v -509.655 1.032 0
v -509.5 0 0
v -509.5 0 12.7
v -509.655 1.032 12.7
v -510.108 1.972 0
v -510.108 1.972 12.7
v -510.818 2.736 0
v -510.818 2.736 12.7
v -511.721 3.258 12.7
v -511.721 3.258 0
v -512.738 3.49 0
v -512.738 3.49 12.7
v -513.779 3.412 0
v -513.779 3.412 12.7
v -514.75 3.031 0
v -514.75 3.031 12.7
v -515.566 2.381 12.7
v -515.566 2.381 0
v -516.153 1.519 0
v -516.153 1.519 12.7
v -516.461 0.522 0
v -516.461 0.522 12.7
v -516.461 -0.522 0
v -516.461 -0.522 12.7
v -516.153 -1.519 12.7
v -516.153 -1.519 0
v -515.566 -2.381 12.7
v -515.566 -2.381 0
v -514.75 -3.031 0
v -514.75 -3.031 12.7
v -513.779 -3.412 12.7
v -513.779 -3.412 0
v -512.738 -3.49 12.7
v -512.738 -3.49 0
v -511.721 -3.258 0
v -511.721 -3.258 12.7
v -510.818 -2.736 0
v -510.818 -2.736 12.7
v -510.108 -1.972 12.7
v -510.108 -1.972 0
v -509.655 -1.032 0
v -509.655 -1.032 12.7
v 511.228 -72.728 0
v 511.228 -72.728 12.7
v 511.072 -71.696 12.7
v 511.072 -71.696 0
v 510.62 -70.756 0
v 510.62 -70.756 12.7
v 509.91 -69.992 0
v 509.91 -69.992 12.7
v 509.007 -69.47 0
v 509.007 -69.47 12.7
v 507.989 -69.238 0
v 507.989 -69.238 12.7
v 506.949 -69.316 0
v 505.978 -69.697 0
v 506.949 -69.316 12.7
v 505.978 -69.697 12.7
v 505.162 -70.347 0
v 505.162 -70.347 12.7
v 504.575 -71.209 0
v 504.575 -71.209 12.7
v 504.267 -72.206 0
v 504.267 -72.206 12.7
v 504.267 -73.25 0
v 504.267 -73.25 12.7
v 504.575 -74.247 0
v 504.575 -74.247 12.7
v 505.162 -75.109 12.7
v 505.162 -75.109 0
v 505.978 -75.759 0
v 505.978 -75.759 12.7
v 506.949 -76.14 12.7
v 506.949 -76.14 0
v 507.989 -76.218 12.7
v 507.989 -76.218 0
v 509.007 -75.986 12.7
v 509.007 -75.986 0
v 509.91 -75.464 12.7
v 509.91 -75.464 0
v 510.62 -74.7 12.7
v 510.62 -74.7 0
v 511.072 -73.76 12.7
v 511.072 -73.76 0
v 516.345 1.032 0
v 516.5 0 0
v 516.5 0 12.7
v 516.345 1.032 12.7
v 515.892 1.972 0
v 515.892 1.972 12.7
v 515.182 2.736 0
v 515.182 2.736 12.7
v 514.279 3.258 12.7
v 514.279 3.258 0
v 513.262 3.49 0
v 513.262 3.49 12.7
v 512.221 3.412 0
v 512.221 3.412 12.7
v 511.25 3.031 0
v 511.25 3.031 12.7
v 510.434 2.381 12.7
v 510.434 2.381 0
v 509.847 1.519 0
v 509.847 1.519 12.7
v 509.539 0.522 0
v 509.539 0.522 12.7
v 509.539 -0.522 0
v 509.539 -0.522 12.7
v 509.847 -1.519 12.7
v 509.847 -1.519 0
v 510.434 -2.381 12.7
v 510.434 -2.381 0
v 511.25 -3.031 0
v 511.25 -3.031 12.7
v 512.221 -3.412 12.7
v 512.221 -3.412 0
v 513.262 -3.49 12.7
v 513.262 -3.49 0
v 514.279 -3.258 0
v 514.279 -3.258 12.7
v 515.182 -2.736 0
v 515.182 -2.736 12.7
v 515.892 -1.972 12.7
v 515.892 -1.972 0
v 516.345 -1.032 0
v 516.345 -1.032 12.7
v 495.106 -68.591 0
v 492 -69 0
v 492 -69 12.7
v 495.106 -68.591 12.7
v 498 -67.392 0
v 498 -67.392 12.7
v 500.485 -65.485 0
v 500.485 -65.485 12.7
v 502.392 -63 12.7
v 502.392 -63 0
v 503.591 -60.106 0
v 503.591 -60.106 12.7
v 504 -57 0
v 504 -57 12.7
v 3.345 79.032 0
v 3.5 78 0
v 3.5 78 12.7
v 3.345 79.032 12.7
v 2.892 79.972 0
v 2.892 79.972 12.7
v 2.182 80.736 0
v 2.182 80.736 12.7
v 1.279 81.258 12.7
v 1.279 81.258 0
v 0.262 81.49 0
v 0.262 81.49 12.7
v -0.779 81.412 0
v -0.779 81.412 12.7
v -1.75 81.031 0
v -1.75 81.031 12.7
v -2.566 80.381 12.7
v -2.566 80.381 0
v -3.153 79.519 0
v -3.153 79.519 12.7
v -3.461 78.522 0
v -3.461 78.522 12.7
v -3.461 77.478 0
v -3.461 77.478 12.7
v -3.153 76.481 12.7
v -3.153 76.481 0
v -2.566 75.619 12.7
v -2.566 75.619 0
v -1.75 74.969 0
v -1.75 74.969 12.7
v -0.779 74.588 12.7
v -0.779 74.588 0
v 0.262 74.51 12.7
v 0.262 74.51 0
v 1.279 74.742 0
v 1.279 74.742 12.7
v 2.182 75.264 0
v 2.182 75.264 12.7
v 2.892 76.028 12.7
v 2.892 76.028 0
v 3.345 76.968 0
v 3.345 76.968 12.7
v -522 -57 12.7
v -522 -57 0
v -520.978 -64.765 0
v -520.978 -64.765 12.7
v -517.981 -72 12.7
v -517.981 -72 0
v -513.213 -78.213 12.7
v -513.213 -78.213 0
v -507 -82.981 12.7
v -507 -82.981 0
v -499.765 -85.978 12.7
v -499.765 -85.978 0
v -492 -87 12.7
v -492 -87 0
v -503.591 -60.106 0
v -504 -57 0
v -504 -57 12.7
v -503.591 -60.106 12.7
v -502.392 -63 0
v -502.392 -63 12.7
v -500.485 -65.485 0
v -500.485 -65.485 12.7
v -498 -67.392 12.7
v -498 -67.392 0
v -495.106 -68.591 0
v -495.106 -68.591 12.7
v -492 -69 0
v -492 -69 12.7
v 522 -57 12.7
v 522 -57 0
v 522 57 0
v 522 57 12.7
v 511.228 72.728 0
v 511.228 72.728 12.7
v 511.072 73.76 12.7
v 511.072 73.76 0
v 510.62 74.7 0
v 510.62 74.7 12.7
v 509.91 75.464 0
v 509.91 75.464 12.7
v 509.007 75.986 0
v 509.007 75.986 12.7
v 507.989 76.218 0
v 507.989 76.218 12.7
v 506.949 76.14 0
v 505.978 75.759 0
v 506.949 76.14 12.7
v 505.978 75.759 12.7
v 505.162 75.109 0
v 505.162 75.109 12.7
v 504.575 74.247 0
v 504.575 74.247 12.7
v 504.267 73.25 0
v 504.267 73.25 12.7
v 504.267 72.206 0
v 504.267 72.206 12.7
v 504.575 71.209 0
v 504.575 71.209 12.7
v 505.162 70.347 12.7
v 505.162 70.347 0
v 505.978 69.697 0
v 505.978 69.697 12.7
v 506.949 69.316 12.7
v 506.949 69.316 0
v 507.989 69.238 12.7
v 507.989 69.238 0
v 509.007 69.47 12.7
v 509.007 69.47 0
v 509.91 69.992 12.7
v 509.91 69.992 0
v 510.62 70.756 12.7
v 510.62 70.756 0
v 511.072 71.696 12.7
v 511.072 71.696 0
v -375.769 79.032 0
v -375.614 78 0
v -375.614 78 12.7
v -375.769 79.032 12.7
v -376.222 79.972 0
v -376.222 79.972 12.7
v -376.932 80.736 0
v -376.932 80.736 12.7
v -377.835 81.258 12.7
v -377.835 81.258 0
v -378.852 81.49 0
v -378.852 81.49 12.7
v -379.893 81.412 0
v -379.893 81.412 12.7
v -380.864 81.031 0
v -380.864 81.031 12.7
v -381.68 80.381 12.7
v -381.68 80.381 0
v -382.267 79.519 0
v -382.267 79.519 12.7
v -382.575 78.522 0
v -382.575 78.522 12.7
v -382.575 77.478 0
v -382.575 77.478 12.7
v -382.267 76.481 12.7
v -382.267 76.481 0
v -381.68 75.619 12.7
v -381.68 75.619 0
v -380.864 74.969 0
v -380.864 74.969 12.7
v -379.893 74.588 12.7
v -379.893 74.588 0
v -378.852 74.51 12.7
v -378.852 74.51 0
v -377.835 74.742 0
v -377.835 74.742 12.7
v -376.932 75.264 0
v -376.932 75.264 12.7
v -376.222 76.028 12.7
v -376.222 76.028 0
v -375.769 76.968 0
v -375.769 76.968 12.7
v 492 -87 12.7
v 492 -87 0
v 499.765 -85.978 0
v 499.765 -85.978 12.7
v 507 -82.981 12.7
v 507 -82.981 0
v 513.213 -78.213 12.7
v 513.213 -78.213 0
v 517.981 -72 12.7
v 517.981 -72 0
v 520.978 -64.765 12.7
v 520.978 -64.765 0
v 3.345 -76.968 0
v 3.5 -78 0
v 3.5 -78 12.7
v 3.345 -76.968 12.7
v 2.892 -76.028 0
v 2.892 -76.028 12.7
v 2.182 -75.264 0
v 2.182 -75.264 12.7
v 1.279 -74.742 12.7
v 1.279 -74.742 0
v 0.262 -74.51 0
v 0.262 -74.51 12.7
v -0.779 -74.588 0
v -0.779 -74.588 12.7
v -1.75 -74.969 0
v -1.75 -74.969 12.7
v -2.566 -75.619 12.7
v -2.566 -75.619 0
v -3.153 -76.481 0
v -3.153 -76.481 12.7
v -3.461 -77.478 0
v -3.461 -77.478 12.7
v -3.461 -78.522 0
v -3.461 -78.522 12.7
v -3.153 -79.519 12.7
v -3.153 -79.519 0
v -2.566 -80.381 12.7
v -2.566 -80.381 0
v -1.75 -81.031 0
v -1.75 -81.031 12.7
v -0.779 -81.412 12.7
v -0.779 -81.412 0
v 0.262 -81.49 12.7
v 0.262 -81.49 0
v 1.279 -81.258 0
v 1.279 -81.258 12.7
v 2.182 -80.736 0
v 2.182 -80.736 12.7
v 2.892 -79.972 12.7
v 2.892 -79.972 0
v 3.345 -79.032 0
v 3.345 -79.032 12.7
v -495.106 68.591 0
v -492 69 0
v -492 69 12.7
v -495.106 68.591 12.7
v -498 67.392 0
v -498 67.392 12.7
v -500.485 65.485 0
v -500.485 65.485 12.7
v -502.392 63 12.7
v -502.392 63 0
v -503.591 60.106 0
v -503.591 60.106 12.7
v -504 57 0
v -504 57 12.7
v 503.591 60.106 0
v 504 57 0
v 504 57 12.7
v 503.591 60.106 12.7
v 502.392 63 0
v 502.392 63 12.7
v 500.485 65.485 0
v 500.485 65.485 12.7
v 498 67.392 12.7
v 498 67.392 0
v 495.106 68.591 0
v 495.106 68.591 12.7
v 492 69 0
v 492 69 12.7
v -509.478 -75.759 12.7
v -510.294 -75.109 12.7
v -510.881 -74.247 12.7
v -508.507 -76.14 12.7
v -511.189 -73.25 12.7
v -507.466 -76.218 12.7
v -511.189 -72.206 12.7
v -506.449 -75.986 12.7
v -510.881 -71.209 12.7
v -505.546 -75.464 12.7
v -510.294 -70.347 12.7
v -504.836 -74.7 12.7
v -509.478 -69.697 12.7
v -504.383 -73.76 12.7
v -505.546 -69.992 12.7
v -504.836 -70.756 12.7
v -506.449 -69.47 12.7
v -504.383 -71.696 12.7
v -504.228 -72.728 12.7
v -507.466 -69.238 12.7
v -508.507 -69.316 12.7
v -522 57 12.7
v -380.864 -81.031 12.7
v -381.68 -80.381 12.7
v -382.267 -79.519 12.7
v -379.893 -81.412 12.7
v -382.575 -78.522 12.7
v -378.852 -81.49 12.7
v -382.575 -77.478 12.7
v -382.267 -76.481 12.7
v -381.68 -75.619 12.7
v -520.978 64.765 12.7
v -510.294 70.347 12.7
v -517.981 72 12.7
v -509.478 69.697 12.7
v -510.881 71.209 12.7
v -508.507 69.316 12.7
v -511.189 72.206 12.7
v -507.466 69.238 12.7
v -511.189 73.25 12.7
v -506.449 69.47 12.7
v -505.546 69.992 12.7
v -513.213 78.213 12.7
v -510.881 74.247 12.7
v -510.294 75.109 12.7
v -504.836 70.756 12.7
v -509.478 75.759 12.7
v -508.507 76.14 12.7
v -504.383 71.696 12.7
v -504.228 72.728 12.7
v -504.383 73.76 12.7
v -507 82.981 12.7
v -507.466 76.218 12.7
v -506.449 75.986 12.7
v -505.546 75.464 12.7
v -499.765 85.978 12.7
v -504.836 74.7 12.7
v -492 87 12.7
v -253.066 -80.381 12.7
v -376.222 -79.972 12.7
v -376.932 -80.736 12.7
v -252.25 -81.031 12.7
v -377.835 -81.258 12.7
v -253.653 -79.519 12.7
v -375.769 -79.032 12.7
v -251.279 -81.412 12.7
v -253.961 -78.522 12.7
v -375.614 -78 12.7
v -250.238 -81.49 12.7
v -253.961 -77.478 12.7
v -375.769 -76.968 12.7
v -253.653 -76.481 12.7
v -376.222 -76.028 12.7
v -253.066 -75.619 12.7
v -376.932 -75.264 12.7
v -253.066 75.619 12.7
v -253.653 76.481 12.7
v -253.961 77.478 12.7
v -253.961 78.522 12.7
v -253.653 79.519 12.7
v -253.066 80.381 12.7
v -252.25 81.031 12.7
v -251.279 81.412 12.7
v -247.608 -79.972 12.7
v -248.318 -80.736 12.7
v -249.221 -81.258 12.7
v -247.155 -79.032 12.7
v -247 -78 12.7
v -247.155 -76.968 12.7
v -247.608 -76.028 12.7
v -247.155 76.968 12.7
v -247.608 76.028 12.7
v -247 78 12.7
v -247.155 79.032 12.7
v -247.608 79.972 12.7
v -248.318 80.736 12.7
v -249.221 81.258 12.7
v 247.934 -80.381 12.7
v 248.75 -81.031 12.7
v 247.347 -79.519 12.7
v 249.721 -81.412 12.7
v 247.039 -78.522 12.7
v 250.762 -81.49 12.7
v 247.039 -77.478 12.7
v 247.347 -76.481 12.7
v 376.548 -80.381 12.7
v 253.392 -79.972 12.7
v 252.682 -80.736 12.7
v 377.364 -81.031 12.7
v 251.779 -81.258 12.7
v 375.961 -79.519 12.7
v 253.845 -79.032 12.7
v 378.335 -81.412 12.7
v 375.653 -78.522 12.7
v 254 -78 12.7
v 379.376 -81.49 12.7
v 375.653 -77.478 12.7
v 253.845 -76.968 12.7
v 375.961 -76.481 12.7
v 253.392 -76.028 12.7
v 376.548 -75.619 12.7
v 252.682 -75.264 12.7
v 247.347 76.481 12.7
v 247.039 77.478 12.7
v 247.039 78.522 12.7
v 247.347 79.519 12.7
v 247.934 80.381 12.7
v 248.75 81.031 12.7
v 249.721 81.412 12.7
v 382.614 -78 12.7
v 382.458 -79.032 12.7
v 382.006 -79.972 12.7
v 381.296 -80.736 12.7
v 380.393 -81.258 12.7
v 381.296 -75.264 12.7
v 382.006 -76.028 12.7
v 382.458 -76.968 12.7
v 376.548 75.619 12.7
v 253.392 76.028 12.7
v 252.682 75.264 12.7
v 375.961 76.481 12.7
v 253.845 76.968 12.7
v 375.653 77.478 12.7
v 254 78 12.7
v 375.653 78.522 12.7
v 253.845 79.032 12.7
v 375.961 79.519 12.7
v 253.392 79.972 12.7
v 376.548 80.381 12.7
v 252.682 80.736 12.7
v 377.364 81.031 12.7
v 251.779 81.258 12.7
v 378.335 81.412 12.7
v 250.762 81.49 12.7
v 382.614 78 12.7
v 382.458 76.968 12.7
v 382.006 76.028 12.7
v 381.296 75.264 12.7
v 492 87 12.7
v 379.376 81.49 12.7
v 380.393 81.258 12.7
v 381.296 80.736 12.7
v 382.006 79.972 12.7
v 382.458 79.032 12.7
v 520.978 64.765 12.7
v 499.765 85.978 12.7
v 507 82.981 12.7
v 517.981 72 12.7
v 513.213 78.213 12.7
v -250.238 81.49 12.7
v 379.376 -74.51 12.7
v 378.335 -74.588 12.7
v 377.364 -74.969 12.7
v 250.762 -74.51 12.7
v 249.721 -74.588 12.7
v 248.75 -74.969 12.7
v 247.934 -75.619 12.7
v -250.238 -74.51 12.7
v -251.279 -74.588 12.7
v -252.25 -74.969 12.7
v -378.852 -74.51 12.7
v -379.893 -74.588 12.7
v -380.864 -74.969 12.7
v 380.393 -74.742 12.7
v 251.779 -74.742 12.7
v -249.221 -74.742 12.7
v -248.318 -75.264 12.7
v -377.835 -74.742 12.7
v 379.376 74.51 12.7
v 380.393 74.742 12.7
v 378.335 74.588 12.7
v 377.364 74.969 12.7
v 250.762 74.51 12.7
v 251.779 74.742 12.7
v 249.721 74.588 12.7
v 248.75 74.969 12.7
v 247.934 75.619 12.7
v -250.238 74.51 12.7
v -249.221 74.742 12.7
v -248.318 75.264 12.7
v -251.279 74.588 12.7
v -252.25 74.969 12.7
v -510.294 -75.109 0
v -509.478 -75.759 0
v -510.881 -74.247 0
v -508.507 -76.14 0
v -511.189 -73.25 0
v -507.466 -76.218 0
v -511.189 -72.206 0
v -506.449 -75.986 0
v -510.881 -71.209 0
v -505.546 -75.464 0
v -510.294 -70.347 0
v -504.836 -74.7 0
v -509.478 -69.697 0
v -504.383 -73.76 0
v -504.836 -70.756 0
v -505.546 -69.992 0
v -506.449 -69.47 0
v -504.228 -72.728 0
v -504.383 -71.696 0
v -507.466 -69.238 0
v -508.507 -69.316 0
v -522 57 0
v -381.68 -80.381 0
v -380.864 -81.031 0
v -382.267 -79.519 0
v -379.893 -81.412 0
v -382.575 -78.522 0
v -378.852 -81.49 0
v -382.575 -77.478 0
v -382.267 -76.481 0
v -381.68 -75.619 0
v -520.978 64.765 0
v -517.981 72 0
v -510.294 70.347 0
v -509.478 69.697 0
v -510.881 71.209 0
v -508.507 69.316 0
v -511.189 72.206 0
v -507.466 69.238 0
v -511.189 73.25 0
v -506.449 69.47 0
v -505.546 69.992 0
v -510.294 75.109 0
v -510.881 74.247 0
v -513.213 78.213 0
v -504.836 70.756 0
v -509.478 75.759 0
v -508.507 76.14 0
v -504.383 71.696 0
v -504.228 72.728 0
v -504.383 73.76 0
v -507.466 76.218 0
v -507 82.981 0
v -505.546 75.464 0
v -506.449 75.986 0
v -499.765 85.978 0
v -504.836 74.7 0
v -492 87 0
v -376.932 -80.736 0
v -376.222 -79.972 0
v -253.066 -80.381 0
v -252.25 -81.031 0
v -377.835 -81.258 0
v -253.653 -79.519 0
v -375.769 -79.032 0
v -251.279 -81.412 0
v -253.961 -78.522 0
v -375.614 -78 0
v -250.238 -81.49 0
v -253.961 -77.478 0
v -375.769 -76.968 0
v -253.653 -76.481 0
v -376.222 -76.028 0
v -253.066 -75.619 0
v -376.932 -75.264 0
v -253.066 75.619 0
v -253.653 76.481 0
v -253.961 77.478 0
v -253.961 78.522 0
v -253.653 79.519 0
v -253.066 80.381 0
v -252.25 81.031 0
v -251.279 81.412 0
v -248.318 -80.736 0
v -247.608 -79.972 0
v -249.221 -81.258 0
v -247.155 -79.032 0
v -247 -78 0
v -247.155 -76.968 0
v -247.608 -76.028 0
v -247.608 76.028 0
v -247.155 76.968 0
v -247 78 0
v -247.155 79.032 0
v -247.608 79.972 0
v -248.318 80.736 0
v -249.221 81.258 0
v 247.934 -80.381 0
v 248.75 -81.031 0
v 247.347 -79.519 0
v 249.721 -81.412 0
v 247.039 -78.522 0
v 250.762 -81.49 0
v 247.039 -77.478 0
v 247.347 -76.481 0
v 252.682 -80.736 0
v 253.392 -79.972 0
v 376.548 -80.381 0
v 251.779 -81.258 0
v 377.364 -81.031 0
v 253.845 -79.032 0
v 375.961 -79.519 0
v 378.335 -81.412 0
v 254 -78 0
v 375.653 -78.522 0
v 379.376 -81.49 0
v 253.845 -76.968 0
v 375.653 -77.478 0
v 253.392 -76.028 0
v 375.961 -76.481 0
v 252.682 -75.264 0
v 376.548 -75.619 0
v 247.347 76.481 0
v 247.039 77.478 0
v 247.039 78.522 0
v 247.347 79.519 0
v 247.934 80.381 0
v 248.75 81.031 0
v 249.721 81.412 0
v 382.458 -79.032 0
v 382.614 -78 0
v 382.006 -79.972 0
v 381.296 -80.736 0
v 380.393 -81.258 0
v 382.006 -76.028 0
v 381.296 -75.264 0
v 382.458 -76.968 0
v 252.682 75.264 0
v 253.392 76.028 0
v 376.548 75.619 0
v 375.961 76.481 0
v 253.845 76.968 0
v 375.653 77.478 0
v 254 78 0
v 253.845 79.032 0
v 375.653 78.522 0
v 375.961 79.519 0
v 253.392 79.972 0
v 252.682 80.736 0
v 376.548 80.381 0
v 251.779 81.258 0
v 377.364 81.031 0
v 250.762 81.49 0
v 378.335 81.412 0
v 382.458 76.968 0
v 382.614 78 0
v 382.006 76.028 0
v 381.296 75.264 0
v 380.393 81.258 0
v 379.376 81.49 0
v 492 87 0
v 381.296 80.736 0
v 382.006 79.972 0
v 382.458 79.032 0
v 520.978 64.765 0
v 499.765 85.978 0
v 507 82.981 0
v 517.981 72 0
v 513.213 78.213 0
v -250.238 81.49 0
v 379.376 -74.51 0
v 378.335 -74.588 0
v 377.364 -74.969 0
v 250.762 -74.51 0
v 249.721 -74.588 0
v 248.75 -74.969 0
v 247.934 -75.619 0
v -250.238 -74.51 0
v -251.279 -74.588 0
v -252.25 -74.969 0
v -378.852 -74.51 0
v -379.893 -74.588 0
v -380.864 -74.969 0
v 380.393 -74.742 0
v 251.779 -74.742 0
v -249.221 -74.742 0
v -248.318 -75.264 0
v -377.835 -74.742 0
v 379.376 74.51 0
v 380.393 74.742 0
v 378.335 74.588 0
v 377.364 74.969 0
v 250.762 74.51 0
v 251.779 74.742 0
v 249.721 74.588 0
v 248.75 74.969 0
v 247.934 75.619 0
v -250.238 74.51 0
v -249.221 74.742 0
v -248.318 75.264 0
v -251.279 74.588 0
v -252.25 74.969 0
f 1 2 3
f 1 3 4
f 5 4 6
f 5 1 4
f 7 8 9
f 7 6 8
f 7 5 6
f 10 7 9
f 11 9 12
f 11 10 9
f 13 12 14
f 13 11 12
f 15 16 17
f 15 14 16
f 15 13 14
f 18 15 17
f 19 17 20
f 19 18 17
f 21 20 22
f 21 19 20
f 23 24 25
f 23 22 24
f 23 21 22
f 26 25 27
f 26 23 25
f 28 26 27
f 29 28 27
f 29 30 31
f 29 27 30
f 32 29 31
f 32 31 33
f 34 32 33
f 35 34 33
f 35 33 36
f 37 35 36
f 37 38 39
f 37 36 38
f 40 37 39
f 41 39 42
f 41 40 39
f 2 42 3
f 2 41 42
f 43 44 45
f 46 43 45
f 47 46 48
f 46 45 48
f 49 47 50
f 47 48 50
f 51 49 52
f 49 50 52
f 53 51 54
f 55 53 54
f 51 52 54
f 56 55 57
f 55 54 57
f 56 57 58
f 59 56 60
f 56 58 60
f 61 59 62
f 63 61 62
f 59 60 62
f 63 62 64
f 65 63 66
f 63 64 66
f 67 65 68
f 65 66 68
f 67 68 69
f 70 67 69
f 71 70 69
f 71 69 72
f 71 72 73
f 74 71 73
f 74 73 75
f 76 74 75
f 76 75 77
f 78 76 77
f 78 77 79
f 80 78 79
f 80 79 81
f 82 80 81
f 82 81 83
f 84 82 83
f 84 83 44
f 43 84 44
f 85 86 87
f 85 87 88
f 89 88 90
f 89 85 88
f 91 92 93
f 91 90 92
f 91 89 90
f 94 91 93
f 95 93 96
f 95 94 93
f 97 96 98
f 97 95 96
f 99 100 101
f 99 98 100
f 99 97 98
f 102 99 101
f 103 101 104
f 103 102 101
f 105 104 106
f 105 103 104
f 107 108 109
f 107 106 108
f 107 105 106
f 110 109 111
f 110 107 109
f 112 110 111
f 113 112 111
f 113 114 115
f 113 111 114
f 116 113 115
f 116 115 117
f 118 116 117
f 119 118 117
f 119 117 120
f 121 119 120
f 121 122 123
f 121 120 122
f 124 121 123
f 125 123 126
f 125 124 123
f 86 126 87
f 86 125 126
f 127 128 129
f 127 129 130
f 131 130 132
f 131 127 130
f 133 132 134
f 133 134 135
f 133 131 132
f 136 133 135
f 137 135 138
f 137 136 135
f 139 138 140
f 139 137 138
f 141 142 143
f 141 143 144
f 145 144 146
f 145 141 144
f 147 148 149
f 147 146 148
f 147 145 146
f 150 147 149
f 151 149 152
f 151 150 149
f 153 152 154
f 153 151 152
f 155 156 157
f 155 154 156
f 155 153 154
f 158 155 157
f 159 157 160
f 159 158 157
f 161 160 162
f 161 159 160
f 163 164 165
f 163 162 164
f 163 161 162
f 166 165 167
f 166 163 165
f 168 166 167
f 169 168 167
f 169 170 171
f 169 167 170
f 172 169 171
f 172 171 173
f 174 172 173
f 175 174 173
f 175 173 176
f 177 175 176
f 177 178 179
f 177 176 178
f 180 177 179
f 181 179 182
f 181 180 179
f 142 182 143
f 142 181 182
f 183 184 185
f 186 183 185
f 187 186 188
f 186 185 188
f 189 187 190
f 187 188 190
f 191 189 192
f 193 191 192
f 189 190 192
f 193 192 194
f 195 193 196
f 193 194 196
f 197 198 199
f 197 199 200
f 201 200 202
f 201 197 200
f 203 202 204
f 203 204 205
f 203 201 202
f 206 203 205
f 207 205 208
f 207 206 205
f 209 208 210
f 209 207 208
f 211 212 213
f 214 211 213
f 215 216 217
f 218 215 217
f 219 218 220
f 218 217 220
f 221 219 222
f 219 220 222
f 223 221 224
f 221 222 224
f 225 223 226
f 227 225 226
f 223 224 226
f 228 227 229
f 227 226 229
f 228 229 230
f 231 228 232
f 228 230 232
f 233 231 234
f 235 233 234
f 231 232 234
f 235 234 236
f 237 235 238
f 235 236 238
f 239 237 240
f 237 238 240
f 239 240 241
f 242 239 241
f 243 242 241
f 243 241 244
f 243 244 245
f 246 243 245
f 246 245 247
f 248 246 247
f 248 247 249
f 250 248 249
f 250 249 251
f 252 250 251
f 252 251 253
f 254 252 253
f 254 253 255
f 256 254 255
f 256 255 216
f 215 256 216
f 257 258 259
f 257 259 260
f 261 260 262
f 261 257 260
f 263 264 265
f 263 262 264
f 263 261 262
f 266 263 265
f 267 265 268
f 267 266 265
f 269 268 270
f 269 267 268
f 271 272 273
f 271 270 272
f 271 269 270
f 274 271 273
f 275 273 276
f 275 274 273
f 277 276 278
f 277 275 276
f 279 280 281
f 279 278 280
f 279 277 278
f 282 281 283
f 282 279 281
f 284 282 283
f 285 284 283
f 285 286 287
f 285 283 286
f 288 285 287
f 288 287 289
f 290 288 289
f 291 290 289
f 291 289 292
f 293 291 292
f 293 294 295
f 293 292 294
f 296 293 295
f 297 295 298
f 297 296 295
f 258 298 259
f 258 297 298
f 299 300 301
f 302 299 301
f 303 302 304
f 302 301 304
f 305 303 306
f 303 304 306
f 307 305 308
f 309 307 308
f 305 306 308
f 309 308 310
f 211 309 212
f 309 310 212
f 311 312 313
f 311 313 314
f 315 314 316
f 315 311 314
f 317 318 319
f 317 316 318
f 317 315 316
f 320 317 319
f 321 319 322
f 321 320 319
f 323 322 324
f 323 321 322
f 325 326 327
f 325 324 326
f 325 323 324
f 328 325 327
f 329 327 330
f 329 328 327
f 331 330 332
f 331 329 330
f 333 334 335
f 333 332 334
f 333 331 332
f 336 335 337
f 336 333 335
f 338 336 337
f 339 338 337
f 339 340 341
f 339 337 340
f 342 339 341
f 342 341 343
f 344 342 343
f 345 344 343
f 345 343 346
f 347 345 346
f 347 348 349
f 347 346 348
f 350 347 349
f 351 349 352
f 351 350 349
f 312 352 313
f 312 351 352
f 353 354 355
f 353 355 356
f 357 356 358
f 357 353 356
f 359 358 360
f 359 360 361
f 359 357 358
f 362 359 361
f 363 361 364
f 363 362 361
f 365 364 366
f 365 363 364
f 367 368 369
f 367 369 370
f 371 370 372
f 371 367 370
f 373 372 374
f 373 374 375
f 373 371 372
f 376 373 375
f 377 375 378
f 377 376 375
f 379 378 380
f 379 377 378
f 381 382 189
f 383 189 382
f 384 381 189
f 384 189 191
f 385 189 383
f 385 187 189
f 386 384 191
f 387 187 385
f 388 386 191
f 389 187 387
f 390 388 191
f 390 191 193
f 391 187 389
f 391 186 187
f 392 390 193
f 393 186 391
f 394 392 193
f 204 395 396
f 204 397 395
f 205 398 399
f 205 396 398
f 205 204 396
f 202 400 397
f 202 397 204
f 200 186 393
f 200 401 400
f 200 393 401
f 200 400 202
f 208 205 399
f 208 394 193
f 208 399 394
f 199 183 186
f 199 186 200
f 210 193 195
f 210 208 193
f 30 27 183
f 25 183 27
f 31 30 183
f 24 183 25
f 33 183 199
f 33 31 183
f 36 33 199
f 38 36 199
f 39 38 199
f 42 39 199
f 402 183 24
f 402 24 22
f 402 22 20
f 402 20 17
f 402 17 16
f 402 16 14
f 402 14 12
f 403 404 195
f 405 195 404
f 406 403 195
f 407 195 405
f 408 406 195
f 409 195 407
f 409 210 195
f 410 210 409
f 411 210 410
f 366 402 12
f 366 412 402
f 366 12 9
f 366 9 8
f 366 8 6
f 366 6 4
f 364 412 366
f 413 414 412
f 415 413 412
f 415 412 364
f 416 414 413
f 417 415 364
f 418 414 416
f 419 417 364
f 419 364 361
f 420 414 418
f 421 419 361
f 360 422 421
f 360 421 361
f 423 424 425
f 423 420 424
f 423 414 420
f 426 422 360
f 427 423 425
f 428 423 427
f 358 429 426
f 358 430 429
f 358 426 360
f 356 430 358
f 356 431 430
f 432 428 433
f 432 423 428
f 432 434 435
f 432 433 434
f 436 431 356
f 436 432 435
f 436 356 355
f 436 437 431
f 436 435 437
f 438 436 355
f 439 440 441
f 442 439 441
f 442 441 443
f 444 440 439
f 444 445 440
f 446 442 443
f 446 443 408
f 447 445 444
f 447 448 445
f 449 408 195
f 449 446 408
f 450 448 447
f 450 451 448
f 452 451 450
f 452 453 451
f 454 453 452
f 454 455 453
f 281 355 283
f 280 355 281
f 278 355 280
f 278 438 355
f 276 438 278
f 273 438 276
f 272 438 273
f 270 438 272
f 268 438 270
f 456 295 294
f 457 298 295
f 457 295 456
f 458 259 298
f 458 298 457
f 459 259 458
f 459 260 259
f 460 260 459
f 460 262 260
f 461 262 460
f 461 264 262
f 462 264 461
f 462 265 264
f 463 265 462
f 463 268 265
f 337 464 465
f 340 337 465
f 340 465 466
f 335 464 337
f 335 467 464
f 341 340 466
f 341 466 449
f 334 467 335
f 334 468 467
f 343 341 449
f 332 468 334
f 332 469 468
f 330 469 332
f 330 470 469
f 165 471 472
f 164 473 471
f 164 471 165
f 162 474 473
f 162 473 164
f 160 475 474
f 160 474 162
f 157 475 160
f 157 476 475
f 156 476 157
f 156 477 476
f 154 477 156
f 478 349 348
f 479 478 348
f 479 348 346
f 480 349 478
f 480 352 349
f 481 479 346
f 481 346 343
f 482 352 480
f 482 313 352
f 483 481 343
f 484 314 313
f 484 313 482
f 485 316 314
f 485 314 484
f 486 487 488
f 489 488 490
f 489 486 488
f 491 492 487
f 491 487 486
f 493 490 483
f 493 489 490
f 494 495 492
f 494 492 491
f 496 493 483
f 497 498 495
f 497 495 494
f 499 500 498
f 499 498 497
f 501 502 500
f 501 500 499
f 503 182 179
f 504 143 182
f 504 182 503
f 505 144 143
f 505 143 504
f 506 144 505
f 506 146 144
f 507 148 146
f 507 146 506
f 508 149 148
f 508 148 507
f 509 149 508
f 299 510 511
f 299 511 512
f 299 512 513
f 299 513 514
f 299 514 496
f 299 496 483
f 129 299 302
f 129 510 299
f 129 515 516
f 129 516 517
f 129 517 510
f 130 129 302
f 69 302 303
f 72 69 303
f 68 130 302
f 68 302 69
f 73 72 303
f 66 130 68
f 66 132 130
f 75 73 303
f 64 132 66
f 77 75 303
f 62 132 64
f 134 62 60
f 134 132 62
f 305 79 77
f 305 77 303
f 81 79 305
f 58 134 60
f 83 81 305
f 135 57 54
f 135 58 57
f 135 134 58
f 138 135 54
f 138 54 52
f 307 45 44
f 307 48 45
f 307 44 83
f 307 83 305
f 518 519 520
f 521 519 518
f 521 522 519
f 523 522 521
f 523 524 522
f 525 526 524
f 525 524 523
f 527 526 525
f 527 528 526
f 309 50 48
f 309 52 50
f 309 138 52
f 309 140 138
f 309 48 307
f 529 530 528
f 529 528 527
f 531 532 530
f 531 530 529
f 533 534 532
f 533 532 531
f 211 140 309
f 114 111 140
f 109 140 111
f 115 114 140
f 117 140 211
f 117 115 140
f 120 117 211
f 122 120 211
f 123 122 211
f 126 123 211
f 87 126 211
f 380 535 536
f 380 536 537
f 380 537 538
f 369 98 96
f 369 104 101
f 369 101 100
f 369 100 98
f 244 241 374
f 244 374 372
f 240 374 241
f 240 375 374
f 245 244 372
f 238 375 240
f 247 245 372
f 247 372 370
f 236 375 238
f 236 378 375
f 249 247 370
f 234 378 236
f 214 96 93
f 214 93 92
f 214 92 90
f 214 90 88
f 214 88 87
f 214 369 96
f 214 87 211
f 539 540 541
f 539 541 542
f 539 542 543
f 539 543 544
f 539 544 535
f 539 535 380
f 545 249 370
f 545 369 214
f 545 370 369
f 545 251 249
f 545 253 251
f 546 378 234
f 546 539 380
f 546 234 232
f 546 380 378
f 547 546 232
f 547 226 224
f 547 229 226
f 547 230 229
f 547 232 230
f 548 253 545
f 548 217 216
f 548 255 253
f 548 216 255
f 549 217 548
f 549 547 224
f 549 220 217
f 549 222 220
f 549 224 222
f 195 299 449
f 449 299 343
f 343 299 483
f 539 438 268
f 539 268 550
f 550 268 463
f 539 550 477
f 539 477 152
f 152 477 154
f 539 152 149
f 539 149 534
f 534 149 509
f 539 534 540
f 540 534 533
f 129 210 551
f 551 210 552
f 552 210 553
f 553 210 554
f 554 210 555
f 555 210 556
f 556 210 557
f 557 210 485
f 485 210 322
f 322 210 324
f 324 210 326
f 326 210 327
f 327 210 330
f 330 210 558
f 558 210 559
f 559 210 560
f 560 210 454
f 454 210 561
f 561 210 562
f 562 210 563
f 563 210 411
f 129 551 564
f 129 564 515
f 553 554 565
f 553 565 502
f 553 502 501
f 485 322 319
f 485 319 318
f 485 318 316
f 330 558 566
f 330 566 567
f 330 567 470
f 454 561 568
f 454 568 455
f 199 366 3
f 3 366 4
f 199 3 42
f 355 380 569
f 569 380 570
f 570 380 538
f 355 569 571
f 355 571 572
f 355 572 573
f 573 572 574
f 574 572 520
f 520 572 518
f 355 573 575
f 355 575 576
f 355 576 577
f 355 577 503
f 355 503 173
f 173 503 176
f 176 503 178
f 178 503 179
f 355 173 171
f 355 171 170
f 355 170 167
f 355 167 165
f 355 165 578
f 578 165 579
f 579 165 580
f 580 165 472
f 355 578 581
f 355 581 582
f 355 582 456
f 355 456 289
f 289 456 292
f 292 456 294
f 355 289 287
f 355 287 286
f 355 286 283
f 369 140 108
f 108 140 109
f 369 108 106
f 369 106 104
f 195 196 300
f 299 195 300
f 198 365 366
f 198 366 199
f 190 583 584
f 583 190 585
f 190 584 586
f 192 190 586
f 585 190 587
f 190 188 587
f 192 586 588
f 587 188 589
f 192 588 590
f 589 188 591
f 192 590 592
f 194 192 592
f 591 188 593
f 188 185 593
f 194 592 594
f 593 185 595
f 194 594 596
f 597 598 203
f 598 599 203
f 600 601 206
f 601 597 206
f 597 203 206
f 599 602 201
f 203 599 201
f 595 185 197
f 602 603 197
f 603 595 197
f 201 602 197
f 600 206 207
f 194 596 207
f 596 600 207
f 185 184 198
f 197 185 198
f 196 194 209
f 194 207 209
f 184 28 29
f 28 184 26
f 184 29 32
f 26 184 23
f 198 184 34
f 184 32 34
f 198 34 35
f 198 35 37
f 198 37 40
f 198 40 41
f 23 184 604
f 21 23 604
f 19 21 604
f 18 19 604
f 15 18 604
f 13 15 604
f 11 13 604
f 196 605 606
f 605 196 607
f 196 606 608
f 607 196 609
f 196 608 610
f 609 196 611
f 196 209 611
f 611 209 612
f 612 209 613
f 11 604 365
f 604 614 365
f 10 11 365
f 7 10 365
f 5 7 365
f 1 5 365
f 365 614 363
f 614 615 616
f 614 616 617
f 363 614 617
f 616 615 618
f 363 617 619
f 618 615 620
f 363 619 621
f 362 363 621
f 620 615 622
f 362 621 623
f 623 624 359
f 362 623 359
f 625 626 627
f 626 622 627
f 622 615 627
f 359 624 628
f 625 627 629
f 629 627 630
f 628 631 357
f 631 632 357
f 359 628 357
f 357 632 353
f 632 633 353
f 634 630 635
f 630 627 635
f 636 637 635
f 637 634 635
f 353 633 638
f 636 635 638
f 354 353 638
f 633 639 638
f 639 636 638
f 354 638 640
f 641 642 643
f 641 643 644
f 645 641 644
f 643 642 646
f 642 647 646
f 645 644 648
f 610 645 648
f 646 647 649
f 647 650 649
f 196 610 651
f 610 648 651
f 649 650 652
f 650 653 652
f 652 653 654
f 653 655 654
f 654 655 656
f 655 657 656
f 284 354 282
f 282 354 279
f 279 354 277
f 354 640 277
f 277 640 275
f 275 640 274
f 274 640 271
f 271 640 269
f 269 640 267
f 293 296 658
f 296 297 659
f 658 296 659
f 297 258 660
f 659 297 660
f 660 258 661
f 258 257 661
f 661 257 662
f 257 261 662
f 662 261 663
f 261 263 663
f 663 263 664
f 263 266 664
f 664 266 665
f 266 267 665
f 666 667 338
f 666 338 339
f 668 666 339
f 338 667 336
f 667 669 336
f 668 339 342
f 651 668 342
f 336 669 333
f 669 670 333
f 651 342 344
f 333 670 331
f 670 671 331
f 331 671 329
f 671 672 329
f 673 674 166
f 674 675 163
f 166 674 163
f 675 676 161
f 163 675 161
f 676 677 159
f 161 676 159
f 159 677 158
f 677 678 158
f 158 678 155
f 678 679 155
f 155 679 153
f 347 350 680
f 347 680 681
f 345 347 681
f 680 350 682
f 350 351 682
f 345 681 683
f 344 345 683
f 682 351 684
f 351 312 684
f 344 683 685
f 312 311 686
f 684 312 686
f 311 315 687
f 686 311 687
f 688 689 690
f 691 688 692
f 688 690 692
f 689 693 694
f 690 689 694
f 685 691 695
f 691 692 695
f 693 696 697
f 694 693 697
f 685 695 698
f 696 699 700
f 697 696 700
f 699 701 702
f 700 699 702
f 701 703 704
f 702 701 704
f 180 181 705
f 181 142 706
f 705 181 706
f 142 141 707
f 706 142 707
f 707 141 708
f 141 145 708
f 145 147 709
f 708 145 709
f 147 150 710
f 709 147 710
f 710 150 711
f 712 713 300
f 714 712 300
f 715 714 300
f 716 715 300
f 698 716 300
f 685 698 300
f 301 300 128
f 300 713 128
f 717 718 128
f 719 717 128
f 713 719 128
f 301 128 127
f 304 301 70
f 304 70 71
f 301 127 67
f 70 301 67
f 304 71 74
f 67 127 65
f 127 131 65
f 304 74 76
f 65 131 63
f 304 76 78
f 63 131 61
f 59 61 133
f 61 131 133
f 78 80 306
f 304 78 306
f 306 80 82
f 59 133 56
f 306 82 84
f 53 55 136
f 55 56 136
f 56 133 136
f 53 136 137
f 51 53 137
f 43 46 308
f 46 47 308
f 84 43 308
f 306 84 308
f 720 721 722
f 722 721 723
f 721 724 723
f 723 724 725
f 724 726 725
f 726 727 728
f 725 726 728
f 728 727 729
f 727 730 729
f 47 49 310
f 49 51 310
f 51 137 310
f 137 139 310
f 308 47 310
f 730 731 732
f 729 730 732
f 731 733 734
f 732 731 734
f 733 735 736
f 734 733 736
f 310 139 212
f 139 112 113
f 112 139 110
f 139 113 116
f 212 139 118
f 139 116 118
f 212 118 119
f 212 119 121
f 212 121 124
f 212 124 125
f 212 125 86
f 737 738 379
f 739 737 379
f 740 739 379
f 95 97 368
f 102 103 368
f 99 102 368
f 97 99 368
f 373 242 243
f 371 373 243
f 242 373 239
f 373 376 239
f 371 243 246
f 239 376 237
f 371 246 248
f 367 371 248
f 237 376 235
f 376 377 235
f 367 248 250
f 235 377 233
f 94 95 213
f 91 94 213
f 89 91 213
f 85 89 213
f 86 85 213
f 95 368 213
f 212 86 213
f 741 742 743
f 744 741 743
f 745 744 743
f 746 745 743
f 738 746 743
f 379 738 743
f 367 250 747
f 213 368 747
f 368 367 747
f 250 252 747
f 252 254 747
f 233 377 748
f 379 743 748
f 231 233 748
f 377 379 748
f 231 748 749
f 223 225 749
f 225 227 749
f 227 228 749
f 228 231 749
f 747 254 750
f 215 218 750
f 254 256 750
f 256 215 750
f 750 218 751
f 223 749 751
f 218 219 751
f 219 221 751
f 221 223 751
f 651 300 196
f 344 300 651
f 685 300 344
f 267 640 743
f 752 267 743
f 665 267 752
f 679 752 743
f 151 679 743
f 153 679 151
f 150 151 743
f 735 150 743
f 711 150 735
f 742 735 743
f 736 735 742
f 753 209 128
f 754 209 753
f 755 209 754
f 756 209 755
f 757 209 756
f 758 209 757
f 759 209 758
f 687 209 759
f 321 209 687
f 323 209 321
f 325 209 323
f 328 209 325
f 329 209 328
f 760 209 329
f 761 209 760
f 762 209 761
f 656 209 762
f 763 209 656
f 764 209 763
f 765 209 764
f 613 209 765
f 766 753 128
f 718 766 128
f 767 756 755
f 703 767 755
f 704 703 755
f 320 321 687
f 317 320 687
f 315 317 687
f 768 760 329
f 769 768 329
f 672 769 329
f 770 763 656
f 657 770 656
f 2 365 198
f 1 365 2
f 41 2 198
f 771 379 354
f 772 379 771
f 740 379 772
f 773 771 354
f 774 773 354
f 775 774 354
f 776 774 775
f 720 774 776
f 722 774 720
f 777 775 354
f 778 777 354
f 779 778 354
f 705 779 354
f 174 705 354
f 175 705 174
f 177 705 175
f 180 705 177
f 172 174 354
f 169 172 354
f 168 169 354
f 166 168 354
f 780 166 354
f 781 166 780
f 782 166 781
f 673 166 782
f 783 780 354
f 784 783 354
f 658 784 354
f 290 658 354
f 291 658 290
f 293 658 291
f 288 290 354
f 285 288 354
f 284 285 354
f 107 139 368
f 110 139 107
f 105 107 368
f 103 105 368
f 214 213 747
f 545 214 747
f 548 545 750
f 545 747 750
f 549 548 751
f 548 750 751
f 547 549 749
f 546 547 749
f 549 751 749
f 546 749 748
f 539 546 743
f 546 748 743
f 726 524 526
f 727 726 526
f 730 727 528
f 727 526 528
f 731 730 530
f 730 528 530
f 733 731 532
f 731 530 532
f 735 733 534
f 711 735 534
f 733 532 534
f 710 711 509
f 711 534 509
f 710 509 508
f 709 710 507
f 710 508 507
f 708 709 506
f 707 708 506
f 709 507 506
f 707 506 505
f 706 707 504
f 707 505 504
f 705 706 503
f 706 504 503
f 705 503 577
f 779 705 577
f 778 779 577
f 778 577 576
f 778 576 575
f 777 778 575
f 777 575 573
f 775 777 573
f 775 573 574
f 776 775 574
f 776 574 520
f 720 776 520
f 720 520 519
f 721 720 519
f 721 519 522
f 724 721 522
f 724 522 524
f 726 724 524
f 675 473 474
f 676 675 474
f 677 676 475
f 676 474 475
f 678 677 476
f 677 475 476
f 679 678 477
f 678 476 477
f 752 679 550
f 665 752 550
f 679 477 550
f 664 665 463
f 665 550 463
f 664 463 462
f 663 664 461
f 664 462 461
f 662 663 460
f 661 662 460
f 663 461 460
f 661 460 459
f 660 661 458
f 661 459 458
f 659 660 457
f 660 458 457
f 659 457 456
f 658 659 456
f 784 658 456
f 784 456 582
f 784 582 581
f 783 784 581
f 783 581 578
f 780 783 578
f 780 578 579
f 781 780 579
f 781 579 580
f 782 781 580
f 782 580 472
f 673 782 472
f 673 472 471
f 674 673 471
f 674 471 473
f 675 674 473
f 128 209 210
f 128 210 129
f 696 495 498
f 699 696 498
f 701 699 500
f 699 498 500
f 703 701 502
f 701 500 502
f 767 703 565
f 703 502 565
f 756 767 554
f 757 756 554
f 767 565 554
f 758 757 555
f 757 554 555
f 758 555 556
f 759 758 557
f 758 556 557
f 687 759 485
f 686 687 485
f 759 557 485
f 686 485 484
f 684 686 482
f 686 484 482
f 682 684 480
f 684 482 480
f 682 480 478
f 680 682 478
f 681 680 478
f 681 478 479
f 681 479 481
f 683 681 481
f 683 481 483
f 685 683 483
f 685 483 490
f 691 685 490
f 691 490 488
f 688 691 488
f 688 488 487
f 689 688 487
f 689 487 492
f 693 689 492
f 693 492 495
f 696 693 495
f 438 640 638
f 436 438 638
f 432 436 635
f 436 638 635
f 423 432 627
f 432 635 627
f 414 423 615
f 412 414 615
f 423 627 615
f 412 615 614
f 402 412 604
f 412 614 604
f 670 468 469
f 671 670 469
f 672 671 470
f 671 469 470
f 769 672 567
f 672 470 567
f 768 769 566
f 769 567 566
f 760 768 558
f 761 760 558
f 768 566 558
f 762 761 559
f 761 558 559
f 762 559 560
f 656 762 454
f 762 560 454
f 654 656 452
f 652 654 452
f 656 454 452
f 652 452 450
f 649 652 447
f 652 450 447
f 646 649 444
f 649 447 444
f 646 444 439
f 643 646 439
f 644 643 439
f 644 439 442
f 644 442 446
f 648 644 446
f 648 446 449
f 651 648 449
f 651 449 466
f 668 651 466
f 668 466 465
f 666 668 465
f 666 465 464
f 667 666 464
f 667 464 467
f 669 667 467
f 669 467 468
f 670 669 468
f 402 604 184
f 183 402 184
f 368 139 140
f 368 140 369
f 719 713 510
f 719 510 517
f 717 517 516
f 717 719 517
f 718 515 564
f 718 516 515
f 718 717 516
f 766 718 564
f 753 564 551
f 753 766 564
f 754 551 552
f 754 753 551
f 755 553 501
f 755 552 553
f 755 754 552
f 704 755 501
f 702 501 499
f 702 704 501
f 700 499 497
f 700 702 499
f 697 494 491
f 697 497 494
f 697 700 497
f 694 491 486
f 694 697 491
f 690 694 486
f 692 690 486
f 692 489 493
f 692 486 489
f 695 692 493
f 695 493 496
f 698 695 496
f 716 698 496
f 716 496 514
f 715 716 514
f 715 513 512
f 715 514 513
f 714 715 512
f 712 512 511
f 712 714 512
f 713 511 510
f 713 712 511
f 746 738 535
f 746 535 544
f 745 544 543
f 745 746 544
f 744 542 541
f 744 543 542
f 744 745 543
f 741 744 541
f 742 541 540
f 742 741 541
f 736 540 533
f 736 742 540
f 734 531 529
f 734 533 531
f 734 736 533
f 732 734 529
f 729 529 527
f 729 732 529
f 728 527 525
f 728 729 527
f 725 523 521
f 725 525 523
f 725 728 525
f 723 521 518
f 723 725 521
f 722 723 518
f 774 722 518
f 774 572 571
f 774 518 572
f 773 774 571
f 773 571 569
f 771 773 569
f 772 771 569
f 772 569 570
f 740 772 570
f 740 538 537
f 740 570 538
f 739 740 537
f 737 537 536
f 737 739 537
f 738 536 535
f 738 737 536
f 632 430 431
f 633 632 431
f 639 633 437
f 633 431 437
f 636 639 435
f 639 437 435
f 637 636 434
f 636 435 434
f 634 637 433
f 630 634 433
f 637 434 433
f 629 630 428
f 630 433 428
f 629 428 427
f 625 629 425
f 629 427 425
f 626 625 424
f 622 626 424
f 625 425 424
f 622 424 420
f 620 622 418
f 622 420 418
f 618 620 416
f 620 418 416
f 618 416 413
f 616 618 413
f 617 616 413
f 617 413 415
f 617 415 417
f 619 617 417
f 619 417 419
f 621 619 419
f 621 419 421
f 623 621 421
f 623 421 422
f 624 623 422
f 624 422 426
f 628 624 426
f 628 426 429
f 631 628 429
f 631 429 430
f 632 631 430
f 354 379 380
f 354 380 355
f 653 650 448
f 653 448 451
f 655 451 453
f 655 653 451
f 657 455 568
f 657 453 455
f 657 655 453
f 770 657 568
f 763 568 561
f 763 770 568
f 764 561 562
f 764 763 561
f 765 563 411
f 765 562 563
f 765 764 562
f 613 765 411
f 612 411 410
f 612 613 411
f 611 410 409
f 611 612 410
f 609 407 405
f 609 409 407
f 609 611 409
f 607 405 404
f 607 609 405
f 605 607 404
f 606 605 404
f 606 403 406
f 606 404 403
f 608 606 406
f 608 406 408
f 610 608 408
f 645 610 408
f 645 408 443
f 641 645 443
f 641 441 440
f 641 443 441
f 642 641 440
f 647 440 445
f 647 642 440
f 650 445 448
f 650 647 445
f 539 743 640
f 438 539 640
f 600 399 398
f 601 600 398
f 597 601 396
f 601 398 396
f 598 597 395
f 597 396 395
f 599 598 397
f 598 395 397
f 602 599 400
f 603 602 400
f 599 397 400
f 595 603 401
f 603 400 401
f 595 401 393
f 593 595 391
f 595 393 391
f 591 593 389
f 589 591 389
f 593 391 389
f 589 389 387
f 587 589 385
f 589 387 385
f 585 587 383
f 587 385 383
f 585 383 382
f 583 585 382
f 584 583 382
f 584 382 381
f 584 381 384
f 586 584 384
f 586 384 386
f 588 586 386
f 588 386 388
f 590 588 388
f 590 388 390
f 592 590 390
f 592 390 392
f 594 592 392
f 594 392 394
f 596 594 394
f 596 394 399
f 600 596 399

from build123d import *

# Parameters (mm, degrees)
BOSS_EXTRUDE1_DEPTH     = 12.7
SKETCH4_R               = 3.5
CUT_EXTRUDE1_DEPTH      = 530.352708504
CUT_EXTRUDE2_DEPTH      = 530.352708504
CUT_EXTRUDE2_DEPTH_BACK = 530.352708504
SKETCH5_R               = 3.5


with BuildPart() as part:
    # Sketch2 → Boss-Extrude1 (new body)
    with BuildSketch(Plane.XY):
        with BuildLine():
            Line((-492, -87), (492, -87))
            ThreePointArc((492, -87), (513.213203436, -78.213203436), (522, -57))
            Line((522, -57), (522, 57))
            ThreePointArc((522, 57), (513.213203436, 78.213203436), (492, 87))
            Line((492, 87), (-492, 87))
            ThreePointArc((-492, 87), (-513.213203436, 78.213203436), (-522, 57))
            Line((-522, 57), (-522, -57))
            ThreePointArc((-522, -57), (-513.213203436, -78.213203436), (-492, -87))
        make_face()
        with BuildLine():
            Line((-492, -69), (492, -69))
            ThreePointArc((492, -69), (500.485281374, -65.485281374), (504, -57))
            Line((504, -57), (504, 57))
            ThreePointArc((504, 57), (500.485281374, 65.485281374), (492, 69))
            Line((492, 69), (-492, 69))
            ThreePointArc((-492, 69), (-500.485281374, 65.485281374), (-504, 57))
            Line((-504, 57), (-504, -57))
            ThreePointArc((-504, -57), (-500.485281374, -65.485281374), (-492, -69))
        make_face(mode=Mode.SUBTRACT)
    extrude(amount=BOSS_EXTRUDE1_DEPTH)

    # Sketch4 → Cut-Extrude1 (cut, through all)
    with BuildSketch(Plane.XY.offset(12.7)):
        with Locations((-507.727922061, 72.727922061)):
            Circle(SKETCH4_R)
        with Locations((-507.727922061, -72.727922061)):
            Circle(SKETCH4_R)
        with Locations((-250.5, -78)):
            Circle(SKETCH4_R)
        with Locations((-250.5, 78)):
            Circle(SKETCH4_R)
        with Locations((250.5, 78)):
            Circle(SKETCH4_R)
        with Locations((250.5, -78)):
            Circle(SKETCH4_R)
        with Locations((507.727922061, 72.727922061)):
            Circle(SKETCH4_R)
        with Locations((507.727922061, -72.727922061)):
            Circle(SKETCH4_R)
    extrude(amount=-CUT_EXTRUDE1_DEPTH, mode=Mode.SUBTRACT)

    # Sketch5 → Cut-Extrude2 (cut, two sides: drawn at the far end of the back side and taken through both)
    with BuildSketch(Plane.XY.offset(12.7).offset(-CUT_EXTRUDE2_DEPTH_BACK)):
        with Locations((-379.113961031, 78)):
            Circle(SKETCH5_R)
        with Locations((-513, 0)):
            Circle(SKETCH5_R)
        with Locations((-379.113961031, -78)):
            Circle(SKETCH5_R)
        with Locations((0, -78)):
            Circle(SKETCH5_R)
        with Locations((0, 78)):
            Circle(SKETCH5_R)
        with Locations((379.113961031, 78)):
            Circle(SKETCH5_R)
        with Locations((379.113961031, -78)):
            Circle(SKETCH5_R)
        with Locations((513, 0)):
            Circle(SKETCH5_R)
    extrude(amount=CUT_EXTRUDE2_DEPTH + CUT_EXTRUDE2_DEPTH_BACK, mode=Mode.SUBTRACT)


solid = part.part
